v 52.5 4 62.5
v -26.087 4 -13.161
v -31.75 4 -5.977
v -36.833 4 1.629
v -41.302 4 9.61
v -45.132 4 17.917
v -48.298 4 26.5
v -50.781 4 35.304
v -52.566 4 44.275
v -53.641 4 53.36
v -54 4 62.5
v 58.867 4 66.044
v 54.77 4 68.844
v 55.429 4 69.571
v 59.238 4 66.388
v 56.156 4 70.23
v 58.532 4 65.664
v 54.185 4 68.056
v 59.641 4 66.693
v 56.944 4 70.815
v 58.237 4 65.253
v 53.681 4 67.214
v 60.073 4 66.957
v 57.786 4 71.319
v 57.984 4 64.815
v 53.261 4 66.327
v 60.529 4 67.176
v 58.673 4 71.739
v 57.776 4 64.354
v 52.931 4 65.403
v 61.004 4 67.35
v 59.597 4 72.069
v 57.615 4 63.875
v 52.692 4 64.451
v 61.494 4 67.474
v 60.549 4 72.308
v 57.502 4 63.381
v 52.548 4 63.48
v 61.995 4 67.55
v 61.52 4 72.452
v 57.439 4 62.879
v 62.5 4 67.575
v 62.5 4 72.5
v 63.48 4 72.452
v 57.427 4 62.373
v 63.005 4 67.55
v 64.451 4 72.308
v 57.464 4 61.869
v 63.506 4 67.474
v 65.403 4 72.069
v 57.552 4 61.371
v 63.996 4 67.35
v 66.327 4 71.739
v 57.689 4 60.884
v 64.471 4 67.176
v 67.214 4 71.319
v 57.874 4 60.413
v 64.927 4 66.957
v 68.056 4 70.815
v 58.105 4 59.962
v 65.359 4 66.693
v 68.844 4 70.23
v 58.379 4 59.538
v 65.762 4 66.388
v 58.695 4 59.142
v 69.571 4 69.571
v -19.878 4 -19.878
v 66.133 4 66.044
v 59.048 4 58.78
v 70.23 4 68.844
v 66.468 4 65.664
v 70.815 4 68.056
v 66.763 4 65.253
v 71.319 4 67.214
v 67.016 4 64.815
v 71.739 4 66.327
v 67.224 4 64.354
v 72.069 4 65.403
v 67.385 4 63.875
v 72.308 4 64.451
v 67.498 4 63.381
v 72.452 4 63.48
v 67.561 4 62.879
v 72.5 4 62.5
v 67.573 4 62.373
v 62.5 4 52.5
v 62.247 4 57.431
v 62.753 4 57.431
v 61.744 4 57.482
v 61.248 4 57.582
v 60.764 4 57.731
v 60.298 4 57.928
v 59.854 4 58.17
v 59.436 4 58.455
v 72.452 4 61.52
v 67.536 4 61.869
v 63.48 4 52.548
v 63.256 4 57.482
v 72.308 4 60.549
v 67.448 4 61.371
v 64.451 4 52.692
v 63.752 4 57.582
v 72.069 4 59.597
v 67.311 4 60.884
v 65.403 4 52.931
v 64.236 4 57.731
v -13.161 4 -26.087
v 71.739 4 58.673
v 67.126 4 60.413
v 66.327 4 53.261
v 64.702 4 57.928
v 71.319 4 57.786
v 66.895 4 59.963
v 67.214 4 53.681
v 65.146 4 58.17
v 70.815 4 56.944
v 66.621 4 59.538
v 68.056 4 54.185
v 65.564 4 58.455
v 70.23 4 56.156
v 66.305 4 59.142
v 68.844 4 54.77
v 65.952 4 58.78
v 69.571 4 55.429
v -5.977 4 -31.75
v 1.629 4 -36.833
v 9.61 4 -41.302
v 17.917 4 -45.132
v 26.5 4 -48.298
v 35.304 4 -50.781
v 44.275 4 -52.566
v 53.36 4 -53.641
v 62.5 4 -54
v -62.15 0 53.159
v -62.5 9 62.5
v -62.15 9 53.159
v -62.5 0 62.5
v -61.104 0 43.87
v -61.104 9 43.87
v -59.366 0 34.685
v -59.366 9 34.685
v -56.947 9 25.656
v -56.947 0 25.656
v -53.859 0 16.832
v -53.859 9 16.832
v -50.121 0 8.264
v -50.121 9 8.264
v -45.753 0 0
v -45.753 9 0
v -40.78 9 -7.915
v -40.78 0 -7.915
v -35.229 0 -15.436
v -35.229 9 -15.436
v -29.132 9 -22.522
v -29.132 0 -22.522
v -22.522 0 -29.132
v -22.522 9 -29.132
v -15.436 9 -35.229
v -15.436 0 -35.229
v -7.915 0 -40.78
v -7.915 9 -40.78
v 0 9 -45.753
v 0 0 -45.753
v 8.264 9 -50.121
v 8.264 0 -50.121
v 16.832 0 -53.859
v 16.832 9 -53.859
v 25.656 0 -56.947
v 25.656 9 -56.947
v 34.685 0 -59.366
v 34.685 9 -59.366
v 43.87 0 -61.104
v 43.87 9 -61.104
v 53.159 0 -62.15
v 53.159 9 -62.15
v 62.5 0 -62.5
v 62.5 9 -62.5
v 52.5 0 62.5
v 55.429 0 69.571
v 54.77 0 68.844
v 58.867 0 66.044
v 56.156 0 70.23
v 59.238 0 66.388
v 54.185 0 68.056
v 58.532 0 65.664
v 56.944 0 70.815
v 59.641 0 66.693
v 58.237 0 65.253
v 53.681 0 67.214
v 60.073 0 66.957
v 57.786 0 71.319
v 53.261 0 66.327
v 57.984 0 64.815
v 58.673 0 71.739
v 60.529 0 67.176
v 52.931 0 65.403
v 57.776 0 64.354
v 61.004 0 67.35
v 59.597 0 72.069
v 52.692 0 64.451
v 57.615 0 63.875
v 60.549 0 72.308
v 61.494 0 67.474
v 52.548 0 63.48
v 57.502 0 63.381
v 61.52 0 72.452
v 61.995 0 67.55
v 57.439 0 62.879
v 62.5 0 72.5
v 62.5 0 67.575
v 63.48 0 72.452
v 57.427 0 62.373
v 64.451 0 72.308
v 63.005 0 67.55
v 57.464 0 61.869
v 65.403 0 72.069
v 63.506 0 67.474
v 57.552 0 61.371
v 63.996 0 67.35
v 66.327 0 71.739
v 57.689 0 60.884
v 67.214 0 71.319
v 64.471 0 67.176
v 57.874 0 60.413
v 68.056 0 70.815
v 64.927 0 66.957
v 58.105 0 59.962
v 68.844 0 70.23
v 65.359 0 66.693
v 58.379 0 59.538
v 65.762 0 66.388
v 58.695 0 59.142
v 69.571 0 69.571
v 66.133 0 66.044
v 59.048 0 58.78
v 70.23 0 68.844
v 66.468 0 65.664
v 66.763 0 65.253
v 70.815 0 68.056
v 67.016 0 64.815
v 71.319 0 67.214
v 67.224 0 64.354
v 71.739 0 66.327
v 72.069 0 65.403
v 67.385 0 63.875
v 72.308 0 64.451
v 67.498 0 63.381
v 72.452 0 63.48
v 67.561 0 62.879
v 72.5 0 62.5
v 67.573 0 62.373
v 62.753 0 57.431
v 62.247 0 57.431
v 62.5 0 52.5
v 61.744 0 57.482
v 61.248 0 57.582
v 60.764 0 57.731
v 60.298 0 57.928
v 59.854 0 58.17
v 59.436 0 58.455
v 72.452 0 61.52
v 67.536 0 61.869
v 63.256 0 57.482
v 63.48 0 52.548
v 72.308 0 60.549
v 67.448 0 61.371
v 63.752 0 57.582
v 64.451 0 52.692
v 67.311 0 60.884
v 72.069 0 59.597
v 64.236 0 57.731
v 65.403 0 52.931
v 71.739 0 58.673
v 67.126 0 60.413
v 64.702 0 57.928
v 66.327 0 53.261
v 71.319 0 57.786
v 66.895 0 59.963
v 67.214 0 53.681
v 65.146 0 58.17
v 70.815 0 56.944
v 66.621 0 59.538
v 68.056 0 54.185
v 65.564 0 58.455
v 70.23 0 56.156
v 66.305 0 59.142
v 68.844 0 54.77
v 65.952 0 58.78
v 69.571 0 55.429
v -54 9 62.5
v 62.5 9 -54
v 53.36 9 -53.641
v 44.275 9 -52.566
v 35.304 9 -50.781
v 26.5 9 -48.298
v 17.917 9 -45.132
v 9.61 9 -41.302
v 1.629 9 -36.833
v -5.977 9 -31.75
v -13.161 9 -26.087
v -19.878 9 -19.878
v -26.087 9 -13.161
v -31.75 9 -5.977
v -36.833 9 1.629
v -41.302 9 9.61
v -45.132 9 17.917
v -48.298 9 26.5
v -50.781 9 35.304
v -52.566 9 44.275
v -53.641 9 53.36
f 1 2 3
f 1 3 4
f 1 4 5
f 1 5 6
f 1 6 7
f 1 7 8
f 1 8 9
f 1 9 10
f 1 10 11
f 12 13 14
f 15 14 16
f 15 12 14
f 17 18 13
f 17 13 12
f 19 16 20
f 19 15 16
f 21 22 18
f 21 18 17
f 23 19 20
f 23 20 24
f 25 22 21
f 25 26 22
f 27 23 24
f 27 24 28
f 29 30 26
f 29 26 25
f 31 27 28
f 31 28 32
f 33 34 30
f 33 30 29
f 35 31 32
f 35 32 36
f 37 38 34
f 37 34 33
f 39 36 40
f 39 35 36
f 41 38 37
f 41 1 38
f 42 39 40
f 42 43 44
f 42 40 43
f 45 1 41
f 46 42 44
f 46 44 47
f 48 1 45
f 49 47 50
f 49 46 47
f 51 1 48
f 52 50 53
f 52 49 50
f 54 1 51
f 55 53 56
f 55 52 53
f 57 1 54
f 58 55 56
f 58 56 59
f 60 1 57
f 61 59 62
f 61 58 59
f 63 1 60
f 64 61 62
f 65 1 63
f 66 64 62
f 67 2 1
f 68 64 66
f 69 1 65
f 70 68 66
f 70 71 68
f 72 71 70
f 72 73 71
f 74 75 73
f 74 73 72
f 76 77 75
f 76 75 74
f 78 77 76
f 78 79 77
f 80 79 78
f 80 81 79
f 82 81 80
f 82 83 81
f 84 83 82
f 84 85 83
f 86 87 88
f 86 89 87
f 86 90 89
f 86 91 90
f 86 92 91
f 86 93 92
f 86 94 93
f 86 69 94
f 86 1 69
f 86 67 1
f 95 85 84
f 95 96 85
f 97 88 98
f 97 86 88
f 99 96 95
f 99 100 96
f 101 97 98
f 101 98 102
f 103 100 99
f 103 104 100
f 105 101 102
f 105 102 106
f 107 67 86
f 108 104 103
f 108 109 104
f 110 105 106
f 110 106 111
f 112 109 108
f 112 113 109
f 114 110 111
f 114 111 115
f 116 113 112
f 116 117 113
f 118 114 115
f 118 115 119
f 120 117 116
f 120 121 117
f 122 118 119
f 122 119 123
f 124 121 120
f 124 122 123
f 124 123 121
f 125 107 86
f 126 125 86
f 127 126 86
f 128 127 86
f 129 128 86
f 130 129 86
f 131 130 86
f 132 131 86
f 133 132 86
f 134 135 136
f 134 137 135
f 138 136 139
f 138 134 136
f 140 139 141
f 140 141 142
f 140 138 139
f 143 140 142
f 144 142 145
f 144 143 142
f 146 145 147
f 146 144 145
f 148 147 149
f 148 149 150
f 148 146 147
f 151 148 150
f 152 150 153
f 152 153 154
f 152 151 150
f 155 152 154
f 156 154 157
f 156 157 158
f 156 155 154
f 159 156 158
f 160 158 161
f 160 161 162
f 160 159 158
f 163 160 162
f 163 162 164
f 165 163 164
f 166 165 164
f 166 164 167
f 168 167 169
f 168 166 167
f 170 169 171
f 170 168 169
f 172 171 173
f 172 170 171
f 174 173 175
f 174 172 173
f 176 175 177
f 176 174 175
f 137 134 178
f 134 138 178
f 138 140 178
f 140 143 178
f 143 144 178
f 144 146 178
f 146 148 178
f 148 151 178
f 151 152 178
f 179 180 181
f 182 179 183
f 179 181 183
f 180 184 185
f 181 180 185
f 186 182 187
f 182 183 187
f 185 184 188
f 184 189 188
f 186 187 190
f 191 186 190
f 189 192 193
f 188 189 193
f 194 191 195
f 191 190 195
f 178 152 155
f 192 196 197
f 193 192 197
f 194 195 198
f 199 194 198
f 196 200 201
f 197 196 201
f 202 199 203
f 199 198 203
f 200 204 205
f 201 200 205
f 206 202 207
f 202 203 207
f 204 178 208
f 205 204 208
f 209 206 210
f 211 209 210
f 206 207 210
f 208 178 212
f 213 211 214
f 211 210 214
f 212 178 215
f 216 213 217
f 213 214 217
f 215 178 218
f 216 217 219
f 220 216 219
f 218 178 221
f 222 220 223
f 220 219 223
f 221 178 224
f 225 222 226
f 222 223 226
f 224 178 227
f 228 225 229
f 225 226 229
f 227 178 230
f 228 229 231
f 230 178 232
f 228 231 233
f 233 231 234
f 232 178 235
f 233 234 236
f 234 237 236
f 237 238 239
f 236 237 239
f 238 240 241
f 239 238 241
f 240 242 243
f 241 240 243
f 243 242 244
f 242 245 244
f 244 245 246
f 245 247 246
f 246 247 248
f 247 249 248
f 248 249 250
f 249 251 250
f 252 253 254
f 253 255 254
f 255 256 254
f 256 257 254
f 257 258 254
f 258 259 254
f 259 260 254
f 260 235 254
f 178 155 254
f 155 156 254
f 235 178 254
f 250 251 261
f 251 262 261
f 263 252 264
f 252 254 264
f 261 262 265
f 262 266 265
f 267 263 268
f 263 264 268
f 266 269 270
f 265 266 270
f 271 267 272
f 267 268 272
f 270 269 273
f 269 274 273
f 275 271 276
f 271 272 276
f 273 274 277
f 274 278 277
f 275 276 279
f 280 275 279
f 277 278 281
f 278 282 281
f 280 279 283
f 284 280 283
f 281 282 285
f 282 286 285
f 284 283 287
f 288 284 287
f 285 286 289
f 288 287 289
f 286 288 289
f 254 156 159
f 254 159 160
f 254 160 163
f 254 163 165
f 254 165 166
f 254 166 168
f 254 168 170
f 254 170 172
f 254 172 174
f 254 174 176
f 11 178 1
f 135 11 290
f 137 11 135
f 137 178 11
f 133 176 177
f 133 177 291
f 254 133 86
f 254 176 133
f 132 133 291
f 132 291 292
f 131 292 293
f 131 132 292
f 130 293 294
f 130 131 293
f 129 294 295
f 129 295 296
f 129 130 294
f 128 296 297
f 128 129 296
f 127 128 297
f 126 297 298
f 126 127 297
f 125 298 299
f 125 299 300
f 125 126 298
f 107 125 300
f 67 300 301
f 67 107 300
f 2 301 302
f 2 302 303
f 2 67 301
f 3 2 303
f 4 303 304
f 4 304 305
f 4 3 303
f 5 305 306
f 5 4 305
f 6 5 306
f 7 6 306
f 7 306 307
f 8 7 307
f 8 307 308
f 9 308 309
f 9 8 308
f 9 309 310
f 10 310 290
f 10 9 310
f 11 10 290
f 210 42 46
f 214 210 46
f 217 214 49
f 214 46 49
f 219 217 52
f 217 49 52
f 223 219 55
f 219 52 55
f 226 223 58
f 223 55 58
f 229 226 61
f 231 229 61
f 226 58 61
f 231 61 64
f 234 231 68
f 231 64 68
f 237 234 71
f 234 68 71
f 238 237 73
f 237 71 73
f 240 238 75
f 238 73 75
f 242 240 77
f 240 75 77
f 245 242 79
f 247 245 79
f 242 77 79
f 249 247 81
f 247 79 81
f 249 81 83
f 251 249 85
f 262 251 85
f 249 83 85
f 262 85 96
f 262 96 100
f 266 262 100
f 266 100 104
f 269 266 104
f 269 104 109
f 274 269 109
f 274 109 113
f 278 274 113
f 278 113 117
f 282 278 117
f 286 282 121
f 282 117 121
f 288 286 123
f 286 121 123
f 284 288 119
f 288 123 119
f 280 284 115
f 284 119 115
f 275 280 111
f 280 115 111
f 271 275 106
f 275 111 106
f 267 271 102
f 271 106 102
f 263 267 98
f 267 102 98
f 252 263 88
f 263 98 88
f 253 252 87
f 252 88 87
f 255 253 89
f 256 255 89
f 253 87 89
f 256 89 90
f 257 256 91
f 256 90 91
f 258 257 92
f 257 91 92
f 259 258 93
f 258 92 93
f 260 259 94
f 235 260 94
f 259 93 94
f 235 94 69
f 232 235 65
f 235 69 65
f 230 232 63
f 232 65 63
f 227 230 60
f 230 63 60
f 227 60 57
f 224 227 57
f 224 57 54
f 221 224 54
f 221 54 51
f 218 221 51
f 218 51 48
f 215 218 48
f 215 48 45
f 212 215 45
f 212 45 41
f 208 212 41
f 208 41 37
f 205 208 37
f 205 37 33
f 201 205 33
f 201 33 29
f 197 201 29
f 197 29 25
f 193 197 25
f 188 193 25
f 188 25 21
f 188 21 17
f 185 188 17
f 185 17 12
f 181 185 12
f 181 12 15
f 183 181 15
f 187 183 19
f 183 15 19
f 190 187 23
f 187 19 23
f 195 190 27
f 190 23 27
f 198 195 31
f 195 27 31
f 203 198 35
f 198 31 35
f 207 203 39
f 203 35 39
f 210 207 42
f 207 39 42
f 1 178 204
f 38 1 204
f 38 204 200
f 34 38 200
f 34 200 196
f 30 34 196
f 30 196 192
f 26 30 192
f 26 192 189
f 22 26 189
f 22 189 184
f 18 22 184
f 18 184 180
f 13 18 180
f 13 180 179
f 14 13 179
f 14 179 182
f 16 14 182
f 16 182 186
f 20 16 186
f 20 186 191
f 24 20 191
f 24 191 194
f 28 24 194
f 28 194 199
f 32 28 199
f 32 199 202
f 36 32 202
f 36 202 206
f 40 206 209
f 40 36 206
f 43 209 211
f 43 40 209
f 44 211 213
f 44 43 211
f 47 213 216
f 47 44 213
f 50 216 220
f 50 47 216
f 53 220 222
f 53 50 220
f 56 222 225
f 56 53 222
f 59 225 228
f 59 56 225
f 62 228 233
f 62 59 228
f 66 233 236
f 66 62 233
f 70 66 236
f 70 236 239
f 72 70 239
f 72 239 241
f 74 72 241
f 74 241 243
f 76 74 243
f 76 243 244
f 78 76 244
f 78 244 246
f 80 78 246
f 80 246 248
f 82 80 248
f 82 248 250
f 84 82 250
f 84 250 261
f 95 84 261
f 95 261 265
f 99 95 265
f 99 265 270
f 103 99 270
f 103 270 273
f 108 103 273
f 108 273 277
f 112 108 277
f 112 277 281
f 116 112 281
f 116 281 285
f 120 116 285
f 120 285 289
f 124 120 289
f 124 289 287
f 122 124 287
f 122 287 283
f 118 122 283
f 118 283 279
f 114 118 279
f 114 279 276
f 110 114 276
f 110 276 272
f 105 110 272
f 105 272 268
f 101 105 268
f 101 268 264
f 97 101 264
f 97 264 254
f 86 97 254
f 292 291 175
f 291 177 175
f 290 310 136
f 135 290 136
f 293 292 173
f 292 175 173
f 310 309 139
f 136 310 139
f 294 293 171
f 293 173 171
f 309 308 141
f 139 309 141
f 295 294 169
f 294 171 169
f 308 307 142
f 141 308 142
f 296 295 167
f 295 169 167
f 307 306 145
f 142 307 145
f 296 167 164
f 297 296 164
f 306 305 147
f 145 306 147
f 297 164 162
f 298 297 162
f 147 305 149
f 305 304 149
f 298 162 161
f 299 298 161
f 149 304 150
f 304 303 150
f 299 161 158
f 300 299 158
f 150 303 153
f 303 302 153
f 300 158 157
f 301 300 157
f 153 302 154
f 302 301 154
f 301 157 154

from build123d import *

# Parameters (mm, degrees)
SKETCH1_W           = 125
SKETCH1_H           = 125
BOSS_EXTRUDE1_DEPTH = 4
BOSS_EXTRUDE2_DEPTH = 5
SKETCH3_R           = 10
BOSS_EXTRUDE3_DEPTH = 4
SKETCH4_R           = 5.075
CUT_EXTRUDE1_DEPTH  = 4
FILLET1_R           = 125


with BuildPart() as part:
    # Sketch1 → Boss-Extrude1 (new body)
    with BuildSketch(Plane(origin=(0, 0, 0), x_dir=(1, 0, 0), z_dir=(0, 1, 0))):
        Rectangle(SKETCH1_W, SKETCH1_H)
    extrude(amount=BOSS_EXTRUDE1_DEPTH)

    # Sketch2 → Boss-Extrude2 (add)
    with BuildSketch(Plane(origin=(0, 4, 0), x_dir=(1, 0, 0), z_dir=(0, 1, 0))):
        with BuildLine():
            Line((-62.5, -62.5), (-62.5, 62.5))
            Line((-62.5, 62.5), (62.5, 62.5))
            Line((62.5, 62.5), (62.5, 54))
            ThreePointArc((62.5, 54), (-19.877940008, 19.877940008), (-54, -62.5))
            Line((-54, -62.5), (-62.5, -62.5))
        make_face()
    extrude(amount=BOSS_EXTRUDE2_DEPTH)

    # Sketch3 → Boss-Extrude3 (add)
    with BuildSketch(Plane(origin=(0, 4, 0), x_dir=(1, 0, 0), z_dir=(0, 1, 0))):
        with Locations((62.5, -62.5)):
            Circle(SKETCH3_R)
    extrude(amount=-BOSS_EXTRUDE3_DEPTH)

    # Sketch4 → Cut-Extrude1 (cut)
    with BuildSketch(Plane(origin=(0, 4, 0), x_dir=(1, 0, 0), z_dir=(0, 1, 0))):
        with Locations(Location((62.5, -62.5, 0), (0, 0, 270))):
            Circle(SKETCH4_R)
    extrude(amount=-CUT_EXTRUDE1_DEPTH, mode=Mode.SUBTRACT)

    # Fillet1
    fillet1_edges = [part.edges().sort_by_distance(p)[0] for p in [
        (-62.5, 4.5, -62.5),
    ]]
    fillet(fillet1_edges, radius=FILLET1_R - 0.0001)  # a hair under: the kernel refuses the full size


solid = part.part
